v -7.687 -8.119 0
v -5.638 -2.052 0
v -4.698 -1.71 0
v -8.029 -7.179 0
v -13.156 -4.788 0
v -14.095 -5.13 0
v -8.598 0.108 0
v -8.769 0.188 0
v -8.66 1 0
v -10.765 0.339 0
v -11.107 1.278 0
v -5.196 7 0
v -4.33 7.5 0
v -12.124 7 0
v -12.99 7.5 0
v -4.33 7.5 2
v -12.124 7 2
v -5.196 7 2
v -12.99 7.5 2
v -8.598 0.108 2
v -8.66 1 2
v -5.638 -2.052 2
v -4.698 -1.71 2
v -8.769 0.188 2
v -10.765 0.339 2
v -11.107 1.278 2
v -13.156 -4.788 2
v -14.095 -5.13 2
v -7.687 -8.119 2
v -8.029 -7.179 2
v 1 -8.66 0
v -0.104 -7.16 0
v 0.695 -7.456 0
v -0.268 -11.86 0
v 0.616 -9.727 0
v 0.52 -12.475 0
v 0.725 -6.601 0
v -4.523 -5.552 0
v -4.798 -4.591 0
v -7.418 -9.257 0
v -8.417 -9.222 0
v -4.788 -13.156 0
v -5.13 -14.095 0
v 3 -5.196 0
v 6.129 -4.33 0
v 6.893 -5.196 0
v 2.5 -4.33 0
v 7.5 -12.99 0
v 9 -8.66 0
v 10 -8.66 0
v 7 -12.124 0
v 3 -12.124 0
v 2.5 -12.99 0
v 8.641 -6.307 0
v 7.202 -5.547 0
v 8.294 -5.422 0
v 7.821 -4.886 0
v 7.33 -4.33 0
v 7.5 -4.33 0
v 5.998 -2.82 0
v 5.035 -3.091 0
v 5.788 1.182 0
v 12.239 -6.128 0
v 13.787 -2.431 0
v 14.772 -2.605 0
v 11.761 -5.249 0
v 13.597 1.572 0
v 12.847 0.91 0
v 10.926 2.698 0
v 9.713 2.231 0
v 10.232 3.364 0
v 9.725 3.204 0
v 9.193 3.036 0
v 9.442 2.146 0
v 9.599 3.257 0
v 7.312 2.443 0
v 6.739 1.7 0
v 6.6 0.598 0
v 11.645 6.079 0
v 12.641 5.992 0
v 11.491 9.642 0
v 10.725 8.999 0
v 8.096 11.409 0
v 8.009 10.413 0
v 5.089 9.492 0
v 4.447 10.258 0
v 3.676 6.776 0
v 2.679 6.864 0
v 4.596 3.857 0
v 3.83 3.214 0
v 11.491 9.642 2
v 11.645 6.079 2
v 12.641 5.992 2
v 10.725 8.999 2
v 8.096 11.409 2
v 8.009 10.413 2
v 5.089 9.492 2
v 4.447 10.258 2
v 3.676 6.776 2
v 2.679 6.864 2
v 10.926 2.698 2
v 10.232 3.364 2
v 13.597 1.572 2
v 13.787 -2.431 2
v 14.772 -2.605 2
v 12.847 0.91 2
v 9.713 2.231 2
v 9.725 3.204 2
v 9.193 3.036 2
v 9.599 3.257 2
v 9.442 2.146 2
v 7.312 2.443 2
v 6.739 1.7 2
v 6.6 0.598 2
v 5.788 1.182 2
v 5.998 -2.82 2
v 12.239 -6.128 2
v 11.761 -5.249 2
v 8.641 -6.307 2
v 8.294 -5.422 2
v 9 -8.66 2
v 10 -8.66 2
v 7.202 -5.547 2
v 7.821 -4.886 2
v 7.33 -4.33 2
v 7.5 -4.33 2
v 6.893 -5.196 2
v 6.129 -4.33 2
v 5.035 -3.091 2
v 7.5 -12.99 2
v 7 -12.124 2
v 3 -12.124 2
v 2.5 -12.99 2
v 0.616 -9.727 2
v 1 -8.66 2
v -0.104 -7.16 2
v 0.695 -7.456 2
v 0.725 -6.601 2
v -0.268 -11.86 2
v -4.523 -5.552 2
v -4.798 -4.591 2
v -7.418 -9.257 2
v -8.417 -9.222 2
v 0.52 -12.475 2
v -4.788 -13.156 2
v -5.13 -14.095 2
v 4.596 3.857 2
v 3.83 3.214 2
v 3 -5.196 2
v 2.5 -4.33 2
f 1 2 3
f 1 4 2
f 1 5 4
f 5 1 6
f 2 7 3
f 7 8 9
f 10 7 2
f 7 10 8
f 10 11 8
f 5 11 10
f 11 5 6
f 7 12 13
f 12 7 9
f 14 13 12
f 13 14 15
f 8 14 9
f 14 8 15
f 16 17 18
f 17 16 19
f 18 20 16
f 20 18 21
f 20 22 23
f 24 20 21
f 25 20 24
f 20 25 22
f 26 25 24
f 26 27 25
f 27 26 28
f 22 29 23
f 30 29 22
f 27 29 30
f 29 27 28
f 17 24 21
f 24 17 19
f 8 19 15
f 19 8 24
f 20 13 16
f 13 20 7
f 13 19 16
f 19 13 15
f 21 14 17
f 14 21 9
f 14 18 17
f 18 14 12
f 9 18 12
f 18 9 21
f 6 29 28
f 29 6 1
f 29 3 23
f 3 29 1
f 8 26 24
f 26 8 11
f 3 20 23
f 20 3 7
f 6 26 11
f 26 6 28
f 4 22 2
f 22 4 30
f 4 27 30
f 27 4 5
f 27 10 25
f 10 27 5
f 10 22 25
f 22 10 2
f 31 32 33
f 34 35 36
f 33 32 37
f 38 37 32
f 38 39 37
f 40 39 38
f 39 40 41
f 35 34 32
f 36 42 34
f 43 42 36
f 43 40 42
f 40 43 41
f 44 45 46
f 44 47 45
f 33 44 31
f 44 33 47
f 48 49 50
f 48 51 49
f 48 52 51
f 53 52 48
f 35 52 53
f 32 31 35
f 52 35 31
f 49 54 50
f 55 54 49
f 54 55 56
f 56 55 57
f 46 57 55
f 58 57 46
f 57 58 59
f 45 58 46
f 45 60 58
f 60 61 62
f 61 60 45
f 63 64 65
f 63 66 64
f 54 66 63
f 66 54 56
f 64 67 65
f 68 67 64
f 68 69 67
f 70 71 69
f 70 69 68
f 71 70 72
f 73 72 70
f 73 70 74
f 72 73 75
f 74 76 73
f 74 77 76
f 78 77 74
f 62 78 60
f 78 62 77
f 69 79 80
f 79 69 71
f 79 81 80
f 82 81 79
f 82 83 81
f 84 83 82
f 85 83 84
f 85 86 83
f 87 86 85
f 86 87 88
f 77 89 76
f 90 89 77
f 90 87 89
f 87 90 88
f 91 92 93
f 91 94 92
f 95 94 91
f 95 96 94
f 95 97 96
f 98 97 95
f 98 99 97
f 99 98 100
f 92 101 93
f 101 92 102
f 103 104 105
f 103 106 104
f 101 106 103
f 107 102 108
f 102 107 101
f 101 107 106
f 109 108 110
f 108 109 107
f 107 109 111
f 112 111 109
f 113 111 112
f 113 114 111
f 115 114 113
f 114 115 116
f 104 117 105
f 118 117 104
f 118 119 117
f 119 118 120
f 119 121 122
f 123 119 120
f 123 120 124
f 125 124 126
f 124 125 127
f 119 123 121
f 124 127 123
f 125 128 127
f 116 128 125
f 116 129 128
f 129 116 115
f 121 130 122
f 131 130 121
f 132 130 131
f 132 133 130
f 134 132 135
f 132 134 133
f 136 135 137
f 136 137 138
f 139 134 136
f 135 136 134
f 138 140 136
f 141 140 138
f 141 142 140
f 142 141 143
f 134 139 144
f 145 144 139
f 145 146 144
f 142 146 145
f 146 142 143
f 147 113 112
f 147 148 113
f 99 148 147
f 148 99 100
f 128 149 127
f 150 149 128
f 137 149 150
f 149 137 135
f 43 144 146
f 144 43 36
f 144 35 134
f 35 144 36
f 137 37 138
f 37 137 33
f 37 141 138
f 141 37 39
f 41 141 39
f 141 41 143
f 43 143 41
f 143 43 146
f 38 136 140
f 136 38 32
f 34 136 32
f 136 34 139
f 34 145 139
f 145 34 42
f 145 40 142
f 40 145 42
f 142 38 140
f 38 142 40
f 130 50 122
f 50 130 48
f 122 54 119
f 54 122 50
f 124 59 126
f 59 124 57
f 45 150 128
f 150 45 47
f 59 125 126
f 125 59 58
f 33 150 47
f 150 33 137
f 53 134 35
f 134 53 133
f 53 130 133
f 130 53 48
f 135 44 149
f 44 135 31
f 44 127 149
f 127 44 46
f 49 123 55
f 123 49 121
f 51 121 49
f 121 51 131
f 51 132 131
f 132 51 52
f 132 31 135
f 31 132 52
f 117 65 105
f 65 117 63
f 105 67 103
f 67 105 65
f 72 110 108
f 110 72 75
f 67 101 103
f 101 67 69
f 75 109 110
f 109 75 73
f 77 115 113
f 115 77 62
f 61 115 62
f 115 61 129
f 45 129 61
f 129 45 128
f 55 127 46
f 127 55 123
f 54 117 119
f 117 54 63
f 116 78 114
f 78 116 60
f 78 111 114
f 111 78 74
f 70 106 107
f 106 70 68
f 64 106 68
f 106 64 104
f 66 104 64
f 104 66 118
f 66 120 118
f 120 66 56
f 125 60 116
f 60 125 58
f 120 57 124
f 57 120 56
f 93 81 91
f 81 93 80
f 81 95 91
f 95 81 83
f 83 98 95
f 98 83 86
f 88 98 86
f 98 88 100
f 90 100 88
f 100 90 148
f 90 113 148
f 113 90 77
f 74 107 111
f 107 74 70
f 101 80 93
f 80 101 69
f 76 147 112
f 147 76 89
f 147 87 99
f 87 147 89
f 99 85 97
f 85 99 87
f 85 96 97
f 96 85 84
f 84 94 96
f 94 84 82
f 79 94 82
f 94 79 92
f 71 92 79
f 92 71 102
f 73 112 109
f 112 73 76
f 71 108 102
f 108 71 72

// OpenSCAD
for (i=[3:1:8]) {

rotate ([0,0,i*50])
    translate ([10,0,0])
    linear_extrude(2)
    difference (){
    circle(5 , $fn=i);
    circle(4 , $fn=i);
    }
}
